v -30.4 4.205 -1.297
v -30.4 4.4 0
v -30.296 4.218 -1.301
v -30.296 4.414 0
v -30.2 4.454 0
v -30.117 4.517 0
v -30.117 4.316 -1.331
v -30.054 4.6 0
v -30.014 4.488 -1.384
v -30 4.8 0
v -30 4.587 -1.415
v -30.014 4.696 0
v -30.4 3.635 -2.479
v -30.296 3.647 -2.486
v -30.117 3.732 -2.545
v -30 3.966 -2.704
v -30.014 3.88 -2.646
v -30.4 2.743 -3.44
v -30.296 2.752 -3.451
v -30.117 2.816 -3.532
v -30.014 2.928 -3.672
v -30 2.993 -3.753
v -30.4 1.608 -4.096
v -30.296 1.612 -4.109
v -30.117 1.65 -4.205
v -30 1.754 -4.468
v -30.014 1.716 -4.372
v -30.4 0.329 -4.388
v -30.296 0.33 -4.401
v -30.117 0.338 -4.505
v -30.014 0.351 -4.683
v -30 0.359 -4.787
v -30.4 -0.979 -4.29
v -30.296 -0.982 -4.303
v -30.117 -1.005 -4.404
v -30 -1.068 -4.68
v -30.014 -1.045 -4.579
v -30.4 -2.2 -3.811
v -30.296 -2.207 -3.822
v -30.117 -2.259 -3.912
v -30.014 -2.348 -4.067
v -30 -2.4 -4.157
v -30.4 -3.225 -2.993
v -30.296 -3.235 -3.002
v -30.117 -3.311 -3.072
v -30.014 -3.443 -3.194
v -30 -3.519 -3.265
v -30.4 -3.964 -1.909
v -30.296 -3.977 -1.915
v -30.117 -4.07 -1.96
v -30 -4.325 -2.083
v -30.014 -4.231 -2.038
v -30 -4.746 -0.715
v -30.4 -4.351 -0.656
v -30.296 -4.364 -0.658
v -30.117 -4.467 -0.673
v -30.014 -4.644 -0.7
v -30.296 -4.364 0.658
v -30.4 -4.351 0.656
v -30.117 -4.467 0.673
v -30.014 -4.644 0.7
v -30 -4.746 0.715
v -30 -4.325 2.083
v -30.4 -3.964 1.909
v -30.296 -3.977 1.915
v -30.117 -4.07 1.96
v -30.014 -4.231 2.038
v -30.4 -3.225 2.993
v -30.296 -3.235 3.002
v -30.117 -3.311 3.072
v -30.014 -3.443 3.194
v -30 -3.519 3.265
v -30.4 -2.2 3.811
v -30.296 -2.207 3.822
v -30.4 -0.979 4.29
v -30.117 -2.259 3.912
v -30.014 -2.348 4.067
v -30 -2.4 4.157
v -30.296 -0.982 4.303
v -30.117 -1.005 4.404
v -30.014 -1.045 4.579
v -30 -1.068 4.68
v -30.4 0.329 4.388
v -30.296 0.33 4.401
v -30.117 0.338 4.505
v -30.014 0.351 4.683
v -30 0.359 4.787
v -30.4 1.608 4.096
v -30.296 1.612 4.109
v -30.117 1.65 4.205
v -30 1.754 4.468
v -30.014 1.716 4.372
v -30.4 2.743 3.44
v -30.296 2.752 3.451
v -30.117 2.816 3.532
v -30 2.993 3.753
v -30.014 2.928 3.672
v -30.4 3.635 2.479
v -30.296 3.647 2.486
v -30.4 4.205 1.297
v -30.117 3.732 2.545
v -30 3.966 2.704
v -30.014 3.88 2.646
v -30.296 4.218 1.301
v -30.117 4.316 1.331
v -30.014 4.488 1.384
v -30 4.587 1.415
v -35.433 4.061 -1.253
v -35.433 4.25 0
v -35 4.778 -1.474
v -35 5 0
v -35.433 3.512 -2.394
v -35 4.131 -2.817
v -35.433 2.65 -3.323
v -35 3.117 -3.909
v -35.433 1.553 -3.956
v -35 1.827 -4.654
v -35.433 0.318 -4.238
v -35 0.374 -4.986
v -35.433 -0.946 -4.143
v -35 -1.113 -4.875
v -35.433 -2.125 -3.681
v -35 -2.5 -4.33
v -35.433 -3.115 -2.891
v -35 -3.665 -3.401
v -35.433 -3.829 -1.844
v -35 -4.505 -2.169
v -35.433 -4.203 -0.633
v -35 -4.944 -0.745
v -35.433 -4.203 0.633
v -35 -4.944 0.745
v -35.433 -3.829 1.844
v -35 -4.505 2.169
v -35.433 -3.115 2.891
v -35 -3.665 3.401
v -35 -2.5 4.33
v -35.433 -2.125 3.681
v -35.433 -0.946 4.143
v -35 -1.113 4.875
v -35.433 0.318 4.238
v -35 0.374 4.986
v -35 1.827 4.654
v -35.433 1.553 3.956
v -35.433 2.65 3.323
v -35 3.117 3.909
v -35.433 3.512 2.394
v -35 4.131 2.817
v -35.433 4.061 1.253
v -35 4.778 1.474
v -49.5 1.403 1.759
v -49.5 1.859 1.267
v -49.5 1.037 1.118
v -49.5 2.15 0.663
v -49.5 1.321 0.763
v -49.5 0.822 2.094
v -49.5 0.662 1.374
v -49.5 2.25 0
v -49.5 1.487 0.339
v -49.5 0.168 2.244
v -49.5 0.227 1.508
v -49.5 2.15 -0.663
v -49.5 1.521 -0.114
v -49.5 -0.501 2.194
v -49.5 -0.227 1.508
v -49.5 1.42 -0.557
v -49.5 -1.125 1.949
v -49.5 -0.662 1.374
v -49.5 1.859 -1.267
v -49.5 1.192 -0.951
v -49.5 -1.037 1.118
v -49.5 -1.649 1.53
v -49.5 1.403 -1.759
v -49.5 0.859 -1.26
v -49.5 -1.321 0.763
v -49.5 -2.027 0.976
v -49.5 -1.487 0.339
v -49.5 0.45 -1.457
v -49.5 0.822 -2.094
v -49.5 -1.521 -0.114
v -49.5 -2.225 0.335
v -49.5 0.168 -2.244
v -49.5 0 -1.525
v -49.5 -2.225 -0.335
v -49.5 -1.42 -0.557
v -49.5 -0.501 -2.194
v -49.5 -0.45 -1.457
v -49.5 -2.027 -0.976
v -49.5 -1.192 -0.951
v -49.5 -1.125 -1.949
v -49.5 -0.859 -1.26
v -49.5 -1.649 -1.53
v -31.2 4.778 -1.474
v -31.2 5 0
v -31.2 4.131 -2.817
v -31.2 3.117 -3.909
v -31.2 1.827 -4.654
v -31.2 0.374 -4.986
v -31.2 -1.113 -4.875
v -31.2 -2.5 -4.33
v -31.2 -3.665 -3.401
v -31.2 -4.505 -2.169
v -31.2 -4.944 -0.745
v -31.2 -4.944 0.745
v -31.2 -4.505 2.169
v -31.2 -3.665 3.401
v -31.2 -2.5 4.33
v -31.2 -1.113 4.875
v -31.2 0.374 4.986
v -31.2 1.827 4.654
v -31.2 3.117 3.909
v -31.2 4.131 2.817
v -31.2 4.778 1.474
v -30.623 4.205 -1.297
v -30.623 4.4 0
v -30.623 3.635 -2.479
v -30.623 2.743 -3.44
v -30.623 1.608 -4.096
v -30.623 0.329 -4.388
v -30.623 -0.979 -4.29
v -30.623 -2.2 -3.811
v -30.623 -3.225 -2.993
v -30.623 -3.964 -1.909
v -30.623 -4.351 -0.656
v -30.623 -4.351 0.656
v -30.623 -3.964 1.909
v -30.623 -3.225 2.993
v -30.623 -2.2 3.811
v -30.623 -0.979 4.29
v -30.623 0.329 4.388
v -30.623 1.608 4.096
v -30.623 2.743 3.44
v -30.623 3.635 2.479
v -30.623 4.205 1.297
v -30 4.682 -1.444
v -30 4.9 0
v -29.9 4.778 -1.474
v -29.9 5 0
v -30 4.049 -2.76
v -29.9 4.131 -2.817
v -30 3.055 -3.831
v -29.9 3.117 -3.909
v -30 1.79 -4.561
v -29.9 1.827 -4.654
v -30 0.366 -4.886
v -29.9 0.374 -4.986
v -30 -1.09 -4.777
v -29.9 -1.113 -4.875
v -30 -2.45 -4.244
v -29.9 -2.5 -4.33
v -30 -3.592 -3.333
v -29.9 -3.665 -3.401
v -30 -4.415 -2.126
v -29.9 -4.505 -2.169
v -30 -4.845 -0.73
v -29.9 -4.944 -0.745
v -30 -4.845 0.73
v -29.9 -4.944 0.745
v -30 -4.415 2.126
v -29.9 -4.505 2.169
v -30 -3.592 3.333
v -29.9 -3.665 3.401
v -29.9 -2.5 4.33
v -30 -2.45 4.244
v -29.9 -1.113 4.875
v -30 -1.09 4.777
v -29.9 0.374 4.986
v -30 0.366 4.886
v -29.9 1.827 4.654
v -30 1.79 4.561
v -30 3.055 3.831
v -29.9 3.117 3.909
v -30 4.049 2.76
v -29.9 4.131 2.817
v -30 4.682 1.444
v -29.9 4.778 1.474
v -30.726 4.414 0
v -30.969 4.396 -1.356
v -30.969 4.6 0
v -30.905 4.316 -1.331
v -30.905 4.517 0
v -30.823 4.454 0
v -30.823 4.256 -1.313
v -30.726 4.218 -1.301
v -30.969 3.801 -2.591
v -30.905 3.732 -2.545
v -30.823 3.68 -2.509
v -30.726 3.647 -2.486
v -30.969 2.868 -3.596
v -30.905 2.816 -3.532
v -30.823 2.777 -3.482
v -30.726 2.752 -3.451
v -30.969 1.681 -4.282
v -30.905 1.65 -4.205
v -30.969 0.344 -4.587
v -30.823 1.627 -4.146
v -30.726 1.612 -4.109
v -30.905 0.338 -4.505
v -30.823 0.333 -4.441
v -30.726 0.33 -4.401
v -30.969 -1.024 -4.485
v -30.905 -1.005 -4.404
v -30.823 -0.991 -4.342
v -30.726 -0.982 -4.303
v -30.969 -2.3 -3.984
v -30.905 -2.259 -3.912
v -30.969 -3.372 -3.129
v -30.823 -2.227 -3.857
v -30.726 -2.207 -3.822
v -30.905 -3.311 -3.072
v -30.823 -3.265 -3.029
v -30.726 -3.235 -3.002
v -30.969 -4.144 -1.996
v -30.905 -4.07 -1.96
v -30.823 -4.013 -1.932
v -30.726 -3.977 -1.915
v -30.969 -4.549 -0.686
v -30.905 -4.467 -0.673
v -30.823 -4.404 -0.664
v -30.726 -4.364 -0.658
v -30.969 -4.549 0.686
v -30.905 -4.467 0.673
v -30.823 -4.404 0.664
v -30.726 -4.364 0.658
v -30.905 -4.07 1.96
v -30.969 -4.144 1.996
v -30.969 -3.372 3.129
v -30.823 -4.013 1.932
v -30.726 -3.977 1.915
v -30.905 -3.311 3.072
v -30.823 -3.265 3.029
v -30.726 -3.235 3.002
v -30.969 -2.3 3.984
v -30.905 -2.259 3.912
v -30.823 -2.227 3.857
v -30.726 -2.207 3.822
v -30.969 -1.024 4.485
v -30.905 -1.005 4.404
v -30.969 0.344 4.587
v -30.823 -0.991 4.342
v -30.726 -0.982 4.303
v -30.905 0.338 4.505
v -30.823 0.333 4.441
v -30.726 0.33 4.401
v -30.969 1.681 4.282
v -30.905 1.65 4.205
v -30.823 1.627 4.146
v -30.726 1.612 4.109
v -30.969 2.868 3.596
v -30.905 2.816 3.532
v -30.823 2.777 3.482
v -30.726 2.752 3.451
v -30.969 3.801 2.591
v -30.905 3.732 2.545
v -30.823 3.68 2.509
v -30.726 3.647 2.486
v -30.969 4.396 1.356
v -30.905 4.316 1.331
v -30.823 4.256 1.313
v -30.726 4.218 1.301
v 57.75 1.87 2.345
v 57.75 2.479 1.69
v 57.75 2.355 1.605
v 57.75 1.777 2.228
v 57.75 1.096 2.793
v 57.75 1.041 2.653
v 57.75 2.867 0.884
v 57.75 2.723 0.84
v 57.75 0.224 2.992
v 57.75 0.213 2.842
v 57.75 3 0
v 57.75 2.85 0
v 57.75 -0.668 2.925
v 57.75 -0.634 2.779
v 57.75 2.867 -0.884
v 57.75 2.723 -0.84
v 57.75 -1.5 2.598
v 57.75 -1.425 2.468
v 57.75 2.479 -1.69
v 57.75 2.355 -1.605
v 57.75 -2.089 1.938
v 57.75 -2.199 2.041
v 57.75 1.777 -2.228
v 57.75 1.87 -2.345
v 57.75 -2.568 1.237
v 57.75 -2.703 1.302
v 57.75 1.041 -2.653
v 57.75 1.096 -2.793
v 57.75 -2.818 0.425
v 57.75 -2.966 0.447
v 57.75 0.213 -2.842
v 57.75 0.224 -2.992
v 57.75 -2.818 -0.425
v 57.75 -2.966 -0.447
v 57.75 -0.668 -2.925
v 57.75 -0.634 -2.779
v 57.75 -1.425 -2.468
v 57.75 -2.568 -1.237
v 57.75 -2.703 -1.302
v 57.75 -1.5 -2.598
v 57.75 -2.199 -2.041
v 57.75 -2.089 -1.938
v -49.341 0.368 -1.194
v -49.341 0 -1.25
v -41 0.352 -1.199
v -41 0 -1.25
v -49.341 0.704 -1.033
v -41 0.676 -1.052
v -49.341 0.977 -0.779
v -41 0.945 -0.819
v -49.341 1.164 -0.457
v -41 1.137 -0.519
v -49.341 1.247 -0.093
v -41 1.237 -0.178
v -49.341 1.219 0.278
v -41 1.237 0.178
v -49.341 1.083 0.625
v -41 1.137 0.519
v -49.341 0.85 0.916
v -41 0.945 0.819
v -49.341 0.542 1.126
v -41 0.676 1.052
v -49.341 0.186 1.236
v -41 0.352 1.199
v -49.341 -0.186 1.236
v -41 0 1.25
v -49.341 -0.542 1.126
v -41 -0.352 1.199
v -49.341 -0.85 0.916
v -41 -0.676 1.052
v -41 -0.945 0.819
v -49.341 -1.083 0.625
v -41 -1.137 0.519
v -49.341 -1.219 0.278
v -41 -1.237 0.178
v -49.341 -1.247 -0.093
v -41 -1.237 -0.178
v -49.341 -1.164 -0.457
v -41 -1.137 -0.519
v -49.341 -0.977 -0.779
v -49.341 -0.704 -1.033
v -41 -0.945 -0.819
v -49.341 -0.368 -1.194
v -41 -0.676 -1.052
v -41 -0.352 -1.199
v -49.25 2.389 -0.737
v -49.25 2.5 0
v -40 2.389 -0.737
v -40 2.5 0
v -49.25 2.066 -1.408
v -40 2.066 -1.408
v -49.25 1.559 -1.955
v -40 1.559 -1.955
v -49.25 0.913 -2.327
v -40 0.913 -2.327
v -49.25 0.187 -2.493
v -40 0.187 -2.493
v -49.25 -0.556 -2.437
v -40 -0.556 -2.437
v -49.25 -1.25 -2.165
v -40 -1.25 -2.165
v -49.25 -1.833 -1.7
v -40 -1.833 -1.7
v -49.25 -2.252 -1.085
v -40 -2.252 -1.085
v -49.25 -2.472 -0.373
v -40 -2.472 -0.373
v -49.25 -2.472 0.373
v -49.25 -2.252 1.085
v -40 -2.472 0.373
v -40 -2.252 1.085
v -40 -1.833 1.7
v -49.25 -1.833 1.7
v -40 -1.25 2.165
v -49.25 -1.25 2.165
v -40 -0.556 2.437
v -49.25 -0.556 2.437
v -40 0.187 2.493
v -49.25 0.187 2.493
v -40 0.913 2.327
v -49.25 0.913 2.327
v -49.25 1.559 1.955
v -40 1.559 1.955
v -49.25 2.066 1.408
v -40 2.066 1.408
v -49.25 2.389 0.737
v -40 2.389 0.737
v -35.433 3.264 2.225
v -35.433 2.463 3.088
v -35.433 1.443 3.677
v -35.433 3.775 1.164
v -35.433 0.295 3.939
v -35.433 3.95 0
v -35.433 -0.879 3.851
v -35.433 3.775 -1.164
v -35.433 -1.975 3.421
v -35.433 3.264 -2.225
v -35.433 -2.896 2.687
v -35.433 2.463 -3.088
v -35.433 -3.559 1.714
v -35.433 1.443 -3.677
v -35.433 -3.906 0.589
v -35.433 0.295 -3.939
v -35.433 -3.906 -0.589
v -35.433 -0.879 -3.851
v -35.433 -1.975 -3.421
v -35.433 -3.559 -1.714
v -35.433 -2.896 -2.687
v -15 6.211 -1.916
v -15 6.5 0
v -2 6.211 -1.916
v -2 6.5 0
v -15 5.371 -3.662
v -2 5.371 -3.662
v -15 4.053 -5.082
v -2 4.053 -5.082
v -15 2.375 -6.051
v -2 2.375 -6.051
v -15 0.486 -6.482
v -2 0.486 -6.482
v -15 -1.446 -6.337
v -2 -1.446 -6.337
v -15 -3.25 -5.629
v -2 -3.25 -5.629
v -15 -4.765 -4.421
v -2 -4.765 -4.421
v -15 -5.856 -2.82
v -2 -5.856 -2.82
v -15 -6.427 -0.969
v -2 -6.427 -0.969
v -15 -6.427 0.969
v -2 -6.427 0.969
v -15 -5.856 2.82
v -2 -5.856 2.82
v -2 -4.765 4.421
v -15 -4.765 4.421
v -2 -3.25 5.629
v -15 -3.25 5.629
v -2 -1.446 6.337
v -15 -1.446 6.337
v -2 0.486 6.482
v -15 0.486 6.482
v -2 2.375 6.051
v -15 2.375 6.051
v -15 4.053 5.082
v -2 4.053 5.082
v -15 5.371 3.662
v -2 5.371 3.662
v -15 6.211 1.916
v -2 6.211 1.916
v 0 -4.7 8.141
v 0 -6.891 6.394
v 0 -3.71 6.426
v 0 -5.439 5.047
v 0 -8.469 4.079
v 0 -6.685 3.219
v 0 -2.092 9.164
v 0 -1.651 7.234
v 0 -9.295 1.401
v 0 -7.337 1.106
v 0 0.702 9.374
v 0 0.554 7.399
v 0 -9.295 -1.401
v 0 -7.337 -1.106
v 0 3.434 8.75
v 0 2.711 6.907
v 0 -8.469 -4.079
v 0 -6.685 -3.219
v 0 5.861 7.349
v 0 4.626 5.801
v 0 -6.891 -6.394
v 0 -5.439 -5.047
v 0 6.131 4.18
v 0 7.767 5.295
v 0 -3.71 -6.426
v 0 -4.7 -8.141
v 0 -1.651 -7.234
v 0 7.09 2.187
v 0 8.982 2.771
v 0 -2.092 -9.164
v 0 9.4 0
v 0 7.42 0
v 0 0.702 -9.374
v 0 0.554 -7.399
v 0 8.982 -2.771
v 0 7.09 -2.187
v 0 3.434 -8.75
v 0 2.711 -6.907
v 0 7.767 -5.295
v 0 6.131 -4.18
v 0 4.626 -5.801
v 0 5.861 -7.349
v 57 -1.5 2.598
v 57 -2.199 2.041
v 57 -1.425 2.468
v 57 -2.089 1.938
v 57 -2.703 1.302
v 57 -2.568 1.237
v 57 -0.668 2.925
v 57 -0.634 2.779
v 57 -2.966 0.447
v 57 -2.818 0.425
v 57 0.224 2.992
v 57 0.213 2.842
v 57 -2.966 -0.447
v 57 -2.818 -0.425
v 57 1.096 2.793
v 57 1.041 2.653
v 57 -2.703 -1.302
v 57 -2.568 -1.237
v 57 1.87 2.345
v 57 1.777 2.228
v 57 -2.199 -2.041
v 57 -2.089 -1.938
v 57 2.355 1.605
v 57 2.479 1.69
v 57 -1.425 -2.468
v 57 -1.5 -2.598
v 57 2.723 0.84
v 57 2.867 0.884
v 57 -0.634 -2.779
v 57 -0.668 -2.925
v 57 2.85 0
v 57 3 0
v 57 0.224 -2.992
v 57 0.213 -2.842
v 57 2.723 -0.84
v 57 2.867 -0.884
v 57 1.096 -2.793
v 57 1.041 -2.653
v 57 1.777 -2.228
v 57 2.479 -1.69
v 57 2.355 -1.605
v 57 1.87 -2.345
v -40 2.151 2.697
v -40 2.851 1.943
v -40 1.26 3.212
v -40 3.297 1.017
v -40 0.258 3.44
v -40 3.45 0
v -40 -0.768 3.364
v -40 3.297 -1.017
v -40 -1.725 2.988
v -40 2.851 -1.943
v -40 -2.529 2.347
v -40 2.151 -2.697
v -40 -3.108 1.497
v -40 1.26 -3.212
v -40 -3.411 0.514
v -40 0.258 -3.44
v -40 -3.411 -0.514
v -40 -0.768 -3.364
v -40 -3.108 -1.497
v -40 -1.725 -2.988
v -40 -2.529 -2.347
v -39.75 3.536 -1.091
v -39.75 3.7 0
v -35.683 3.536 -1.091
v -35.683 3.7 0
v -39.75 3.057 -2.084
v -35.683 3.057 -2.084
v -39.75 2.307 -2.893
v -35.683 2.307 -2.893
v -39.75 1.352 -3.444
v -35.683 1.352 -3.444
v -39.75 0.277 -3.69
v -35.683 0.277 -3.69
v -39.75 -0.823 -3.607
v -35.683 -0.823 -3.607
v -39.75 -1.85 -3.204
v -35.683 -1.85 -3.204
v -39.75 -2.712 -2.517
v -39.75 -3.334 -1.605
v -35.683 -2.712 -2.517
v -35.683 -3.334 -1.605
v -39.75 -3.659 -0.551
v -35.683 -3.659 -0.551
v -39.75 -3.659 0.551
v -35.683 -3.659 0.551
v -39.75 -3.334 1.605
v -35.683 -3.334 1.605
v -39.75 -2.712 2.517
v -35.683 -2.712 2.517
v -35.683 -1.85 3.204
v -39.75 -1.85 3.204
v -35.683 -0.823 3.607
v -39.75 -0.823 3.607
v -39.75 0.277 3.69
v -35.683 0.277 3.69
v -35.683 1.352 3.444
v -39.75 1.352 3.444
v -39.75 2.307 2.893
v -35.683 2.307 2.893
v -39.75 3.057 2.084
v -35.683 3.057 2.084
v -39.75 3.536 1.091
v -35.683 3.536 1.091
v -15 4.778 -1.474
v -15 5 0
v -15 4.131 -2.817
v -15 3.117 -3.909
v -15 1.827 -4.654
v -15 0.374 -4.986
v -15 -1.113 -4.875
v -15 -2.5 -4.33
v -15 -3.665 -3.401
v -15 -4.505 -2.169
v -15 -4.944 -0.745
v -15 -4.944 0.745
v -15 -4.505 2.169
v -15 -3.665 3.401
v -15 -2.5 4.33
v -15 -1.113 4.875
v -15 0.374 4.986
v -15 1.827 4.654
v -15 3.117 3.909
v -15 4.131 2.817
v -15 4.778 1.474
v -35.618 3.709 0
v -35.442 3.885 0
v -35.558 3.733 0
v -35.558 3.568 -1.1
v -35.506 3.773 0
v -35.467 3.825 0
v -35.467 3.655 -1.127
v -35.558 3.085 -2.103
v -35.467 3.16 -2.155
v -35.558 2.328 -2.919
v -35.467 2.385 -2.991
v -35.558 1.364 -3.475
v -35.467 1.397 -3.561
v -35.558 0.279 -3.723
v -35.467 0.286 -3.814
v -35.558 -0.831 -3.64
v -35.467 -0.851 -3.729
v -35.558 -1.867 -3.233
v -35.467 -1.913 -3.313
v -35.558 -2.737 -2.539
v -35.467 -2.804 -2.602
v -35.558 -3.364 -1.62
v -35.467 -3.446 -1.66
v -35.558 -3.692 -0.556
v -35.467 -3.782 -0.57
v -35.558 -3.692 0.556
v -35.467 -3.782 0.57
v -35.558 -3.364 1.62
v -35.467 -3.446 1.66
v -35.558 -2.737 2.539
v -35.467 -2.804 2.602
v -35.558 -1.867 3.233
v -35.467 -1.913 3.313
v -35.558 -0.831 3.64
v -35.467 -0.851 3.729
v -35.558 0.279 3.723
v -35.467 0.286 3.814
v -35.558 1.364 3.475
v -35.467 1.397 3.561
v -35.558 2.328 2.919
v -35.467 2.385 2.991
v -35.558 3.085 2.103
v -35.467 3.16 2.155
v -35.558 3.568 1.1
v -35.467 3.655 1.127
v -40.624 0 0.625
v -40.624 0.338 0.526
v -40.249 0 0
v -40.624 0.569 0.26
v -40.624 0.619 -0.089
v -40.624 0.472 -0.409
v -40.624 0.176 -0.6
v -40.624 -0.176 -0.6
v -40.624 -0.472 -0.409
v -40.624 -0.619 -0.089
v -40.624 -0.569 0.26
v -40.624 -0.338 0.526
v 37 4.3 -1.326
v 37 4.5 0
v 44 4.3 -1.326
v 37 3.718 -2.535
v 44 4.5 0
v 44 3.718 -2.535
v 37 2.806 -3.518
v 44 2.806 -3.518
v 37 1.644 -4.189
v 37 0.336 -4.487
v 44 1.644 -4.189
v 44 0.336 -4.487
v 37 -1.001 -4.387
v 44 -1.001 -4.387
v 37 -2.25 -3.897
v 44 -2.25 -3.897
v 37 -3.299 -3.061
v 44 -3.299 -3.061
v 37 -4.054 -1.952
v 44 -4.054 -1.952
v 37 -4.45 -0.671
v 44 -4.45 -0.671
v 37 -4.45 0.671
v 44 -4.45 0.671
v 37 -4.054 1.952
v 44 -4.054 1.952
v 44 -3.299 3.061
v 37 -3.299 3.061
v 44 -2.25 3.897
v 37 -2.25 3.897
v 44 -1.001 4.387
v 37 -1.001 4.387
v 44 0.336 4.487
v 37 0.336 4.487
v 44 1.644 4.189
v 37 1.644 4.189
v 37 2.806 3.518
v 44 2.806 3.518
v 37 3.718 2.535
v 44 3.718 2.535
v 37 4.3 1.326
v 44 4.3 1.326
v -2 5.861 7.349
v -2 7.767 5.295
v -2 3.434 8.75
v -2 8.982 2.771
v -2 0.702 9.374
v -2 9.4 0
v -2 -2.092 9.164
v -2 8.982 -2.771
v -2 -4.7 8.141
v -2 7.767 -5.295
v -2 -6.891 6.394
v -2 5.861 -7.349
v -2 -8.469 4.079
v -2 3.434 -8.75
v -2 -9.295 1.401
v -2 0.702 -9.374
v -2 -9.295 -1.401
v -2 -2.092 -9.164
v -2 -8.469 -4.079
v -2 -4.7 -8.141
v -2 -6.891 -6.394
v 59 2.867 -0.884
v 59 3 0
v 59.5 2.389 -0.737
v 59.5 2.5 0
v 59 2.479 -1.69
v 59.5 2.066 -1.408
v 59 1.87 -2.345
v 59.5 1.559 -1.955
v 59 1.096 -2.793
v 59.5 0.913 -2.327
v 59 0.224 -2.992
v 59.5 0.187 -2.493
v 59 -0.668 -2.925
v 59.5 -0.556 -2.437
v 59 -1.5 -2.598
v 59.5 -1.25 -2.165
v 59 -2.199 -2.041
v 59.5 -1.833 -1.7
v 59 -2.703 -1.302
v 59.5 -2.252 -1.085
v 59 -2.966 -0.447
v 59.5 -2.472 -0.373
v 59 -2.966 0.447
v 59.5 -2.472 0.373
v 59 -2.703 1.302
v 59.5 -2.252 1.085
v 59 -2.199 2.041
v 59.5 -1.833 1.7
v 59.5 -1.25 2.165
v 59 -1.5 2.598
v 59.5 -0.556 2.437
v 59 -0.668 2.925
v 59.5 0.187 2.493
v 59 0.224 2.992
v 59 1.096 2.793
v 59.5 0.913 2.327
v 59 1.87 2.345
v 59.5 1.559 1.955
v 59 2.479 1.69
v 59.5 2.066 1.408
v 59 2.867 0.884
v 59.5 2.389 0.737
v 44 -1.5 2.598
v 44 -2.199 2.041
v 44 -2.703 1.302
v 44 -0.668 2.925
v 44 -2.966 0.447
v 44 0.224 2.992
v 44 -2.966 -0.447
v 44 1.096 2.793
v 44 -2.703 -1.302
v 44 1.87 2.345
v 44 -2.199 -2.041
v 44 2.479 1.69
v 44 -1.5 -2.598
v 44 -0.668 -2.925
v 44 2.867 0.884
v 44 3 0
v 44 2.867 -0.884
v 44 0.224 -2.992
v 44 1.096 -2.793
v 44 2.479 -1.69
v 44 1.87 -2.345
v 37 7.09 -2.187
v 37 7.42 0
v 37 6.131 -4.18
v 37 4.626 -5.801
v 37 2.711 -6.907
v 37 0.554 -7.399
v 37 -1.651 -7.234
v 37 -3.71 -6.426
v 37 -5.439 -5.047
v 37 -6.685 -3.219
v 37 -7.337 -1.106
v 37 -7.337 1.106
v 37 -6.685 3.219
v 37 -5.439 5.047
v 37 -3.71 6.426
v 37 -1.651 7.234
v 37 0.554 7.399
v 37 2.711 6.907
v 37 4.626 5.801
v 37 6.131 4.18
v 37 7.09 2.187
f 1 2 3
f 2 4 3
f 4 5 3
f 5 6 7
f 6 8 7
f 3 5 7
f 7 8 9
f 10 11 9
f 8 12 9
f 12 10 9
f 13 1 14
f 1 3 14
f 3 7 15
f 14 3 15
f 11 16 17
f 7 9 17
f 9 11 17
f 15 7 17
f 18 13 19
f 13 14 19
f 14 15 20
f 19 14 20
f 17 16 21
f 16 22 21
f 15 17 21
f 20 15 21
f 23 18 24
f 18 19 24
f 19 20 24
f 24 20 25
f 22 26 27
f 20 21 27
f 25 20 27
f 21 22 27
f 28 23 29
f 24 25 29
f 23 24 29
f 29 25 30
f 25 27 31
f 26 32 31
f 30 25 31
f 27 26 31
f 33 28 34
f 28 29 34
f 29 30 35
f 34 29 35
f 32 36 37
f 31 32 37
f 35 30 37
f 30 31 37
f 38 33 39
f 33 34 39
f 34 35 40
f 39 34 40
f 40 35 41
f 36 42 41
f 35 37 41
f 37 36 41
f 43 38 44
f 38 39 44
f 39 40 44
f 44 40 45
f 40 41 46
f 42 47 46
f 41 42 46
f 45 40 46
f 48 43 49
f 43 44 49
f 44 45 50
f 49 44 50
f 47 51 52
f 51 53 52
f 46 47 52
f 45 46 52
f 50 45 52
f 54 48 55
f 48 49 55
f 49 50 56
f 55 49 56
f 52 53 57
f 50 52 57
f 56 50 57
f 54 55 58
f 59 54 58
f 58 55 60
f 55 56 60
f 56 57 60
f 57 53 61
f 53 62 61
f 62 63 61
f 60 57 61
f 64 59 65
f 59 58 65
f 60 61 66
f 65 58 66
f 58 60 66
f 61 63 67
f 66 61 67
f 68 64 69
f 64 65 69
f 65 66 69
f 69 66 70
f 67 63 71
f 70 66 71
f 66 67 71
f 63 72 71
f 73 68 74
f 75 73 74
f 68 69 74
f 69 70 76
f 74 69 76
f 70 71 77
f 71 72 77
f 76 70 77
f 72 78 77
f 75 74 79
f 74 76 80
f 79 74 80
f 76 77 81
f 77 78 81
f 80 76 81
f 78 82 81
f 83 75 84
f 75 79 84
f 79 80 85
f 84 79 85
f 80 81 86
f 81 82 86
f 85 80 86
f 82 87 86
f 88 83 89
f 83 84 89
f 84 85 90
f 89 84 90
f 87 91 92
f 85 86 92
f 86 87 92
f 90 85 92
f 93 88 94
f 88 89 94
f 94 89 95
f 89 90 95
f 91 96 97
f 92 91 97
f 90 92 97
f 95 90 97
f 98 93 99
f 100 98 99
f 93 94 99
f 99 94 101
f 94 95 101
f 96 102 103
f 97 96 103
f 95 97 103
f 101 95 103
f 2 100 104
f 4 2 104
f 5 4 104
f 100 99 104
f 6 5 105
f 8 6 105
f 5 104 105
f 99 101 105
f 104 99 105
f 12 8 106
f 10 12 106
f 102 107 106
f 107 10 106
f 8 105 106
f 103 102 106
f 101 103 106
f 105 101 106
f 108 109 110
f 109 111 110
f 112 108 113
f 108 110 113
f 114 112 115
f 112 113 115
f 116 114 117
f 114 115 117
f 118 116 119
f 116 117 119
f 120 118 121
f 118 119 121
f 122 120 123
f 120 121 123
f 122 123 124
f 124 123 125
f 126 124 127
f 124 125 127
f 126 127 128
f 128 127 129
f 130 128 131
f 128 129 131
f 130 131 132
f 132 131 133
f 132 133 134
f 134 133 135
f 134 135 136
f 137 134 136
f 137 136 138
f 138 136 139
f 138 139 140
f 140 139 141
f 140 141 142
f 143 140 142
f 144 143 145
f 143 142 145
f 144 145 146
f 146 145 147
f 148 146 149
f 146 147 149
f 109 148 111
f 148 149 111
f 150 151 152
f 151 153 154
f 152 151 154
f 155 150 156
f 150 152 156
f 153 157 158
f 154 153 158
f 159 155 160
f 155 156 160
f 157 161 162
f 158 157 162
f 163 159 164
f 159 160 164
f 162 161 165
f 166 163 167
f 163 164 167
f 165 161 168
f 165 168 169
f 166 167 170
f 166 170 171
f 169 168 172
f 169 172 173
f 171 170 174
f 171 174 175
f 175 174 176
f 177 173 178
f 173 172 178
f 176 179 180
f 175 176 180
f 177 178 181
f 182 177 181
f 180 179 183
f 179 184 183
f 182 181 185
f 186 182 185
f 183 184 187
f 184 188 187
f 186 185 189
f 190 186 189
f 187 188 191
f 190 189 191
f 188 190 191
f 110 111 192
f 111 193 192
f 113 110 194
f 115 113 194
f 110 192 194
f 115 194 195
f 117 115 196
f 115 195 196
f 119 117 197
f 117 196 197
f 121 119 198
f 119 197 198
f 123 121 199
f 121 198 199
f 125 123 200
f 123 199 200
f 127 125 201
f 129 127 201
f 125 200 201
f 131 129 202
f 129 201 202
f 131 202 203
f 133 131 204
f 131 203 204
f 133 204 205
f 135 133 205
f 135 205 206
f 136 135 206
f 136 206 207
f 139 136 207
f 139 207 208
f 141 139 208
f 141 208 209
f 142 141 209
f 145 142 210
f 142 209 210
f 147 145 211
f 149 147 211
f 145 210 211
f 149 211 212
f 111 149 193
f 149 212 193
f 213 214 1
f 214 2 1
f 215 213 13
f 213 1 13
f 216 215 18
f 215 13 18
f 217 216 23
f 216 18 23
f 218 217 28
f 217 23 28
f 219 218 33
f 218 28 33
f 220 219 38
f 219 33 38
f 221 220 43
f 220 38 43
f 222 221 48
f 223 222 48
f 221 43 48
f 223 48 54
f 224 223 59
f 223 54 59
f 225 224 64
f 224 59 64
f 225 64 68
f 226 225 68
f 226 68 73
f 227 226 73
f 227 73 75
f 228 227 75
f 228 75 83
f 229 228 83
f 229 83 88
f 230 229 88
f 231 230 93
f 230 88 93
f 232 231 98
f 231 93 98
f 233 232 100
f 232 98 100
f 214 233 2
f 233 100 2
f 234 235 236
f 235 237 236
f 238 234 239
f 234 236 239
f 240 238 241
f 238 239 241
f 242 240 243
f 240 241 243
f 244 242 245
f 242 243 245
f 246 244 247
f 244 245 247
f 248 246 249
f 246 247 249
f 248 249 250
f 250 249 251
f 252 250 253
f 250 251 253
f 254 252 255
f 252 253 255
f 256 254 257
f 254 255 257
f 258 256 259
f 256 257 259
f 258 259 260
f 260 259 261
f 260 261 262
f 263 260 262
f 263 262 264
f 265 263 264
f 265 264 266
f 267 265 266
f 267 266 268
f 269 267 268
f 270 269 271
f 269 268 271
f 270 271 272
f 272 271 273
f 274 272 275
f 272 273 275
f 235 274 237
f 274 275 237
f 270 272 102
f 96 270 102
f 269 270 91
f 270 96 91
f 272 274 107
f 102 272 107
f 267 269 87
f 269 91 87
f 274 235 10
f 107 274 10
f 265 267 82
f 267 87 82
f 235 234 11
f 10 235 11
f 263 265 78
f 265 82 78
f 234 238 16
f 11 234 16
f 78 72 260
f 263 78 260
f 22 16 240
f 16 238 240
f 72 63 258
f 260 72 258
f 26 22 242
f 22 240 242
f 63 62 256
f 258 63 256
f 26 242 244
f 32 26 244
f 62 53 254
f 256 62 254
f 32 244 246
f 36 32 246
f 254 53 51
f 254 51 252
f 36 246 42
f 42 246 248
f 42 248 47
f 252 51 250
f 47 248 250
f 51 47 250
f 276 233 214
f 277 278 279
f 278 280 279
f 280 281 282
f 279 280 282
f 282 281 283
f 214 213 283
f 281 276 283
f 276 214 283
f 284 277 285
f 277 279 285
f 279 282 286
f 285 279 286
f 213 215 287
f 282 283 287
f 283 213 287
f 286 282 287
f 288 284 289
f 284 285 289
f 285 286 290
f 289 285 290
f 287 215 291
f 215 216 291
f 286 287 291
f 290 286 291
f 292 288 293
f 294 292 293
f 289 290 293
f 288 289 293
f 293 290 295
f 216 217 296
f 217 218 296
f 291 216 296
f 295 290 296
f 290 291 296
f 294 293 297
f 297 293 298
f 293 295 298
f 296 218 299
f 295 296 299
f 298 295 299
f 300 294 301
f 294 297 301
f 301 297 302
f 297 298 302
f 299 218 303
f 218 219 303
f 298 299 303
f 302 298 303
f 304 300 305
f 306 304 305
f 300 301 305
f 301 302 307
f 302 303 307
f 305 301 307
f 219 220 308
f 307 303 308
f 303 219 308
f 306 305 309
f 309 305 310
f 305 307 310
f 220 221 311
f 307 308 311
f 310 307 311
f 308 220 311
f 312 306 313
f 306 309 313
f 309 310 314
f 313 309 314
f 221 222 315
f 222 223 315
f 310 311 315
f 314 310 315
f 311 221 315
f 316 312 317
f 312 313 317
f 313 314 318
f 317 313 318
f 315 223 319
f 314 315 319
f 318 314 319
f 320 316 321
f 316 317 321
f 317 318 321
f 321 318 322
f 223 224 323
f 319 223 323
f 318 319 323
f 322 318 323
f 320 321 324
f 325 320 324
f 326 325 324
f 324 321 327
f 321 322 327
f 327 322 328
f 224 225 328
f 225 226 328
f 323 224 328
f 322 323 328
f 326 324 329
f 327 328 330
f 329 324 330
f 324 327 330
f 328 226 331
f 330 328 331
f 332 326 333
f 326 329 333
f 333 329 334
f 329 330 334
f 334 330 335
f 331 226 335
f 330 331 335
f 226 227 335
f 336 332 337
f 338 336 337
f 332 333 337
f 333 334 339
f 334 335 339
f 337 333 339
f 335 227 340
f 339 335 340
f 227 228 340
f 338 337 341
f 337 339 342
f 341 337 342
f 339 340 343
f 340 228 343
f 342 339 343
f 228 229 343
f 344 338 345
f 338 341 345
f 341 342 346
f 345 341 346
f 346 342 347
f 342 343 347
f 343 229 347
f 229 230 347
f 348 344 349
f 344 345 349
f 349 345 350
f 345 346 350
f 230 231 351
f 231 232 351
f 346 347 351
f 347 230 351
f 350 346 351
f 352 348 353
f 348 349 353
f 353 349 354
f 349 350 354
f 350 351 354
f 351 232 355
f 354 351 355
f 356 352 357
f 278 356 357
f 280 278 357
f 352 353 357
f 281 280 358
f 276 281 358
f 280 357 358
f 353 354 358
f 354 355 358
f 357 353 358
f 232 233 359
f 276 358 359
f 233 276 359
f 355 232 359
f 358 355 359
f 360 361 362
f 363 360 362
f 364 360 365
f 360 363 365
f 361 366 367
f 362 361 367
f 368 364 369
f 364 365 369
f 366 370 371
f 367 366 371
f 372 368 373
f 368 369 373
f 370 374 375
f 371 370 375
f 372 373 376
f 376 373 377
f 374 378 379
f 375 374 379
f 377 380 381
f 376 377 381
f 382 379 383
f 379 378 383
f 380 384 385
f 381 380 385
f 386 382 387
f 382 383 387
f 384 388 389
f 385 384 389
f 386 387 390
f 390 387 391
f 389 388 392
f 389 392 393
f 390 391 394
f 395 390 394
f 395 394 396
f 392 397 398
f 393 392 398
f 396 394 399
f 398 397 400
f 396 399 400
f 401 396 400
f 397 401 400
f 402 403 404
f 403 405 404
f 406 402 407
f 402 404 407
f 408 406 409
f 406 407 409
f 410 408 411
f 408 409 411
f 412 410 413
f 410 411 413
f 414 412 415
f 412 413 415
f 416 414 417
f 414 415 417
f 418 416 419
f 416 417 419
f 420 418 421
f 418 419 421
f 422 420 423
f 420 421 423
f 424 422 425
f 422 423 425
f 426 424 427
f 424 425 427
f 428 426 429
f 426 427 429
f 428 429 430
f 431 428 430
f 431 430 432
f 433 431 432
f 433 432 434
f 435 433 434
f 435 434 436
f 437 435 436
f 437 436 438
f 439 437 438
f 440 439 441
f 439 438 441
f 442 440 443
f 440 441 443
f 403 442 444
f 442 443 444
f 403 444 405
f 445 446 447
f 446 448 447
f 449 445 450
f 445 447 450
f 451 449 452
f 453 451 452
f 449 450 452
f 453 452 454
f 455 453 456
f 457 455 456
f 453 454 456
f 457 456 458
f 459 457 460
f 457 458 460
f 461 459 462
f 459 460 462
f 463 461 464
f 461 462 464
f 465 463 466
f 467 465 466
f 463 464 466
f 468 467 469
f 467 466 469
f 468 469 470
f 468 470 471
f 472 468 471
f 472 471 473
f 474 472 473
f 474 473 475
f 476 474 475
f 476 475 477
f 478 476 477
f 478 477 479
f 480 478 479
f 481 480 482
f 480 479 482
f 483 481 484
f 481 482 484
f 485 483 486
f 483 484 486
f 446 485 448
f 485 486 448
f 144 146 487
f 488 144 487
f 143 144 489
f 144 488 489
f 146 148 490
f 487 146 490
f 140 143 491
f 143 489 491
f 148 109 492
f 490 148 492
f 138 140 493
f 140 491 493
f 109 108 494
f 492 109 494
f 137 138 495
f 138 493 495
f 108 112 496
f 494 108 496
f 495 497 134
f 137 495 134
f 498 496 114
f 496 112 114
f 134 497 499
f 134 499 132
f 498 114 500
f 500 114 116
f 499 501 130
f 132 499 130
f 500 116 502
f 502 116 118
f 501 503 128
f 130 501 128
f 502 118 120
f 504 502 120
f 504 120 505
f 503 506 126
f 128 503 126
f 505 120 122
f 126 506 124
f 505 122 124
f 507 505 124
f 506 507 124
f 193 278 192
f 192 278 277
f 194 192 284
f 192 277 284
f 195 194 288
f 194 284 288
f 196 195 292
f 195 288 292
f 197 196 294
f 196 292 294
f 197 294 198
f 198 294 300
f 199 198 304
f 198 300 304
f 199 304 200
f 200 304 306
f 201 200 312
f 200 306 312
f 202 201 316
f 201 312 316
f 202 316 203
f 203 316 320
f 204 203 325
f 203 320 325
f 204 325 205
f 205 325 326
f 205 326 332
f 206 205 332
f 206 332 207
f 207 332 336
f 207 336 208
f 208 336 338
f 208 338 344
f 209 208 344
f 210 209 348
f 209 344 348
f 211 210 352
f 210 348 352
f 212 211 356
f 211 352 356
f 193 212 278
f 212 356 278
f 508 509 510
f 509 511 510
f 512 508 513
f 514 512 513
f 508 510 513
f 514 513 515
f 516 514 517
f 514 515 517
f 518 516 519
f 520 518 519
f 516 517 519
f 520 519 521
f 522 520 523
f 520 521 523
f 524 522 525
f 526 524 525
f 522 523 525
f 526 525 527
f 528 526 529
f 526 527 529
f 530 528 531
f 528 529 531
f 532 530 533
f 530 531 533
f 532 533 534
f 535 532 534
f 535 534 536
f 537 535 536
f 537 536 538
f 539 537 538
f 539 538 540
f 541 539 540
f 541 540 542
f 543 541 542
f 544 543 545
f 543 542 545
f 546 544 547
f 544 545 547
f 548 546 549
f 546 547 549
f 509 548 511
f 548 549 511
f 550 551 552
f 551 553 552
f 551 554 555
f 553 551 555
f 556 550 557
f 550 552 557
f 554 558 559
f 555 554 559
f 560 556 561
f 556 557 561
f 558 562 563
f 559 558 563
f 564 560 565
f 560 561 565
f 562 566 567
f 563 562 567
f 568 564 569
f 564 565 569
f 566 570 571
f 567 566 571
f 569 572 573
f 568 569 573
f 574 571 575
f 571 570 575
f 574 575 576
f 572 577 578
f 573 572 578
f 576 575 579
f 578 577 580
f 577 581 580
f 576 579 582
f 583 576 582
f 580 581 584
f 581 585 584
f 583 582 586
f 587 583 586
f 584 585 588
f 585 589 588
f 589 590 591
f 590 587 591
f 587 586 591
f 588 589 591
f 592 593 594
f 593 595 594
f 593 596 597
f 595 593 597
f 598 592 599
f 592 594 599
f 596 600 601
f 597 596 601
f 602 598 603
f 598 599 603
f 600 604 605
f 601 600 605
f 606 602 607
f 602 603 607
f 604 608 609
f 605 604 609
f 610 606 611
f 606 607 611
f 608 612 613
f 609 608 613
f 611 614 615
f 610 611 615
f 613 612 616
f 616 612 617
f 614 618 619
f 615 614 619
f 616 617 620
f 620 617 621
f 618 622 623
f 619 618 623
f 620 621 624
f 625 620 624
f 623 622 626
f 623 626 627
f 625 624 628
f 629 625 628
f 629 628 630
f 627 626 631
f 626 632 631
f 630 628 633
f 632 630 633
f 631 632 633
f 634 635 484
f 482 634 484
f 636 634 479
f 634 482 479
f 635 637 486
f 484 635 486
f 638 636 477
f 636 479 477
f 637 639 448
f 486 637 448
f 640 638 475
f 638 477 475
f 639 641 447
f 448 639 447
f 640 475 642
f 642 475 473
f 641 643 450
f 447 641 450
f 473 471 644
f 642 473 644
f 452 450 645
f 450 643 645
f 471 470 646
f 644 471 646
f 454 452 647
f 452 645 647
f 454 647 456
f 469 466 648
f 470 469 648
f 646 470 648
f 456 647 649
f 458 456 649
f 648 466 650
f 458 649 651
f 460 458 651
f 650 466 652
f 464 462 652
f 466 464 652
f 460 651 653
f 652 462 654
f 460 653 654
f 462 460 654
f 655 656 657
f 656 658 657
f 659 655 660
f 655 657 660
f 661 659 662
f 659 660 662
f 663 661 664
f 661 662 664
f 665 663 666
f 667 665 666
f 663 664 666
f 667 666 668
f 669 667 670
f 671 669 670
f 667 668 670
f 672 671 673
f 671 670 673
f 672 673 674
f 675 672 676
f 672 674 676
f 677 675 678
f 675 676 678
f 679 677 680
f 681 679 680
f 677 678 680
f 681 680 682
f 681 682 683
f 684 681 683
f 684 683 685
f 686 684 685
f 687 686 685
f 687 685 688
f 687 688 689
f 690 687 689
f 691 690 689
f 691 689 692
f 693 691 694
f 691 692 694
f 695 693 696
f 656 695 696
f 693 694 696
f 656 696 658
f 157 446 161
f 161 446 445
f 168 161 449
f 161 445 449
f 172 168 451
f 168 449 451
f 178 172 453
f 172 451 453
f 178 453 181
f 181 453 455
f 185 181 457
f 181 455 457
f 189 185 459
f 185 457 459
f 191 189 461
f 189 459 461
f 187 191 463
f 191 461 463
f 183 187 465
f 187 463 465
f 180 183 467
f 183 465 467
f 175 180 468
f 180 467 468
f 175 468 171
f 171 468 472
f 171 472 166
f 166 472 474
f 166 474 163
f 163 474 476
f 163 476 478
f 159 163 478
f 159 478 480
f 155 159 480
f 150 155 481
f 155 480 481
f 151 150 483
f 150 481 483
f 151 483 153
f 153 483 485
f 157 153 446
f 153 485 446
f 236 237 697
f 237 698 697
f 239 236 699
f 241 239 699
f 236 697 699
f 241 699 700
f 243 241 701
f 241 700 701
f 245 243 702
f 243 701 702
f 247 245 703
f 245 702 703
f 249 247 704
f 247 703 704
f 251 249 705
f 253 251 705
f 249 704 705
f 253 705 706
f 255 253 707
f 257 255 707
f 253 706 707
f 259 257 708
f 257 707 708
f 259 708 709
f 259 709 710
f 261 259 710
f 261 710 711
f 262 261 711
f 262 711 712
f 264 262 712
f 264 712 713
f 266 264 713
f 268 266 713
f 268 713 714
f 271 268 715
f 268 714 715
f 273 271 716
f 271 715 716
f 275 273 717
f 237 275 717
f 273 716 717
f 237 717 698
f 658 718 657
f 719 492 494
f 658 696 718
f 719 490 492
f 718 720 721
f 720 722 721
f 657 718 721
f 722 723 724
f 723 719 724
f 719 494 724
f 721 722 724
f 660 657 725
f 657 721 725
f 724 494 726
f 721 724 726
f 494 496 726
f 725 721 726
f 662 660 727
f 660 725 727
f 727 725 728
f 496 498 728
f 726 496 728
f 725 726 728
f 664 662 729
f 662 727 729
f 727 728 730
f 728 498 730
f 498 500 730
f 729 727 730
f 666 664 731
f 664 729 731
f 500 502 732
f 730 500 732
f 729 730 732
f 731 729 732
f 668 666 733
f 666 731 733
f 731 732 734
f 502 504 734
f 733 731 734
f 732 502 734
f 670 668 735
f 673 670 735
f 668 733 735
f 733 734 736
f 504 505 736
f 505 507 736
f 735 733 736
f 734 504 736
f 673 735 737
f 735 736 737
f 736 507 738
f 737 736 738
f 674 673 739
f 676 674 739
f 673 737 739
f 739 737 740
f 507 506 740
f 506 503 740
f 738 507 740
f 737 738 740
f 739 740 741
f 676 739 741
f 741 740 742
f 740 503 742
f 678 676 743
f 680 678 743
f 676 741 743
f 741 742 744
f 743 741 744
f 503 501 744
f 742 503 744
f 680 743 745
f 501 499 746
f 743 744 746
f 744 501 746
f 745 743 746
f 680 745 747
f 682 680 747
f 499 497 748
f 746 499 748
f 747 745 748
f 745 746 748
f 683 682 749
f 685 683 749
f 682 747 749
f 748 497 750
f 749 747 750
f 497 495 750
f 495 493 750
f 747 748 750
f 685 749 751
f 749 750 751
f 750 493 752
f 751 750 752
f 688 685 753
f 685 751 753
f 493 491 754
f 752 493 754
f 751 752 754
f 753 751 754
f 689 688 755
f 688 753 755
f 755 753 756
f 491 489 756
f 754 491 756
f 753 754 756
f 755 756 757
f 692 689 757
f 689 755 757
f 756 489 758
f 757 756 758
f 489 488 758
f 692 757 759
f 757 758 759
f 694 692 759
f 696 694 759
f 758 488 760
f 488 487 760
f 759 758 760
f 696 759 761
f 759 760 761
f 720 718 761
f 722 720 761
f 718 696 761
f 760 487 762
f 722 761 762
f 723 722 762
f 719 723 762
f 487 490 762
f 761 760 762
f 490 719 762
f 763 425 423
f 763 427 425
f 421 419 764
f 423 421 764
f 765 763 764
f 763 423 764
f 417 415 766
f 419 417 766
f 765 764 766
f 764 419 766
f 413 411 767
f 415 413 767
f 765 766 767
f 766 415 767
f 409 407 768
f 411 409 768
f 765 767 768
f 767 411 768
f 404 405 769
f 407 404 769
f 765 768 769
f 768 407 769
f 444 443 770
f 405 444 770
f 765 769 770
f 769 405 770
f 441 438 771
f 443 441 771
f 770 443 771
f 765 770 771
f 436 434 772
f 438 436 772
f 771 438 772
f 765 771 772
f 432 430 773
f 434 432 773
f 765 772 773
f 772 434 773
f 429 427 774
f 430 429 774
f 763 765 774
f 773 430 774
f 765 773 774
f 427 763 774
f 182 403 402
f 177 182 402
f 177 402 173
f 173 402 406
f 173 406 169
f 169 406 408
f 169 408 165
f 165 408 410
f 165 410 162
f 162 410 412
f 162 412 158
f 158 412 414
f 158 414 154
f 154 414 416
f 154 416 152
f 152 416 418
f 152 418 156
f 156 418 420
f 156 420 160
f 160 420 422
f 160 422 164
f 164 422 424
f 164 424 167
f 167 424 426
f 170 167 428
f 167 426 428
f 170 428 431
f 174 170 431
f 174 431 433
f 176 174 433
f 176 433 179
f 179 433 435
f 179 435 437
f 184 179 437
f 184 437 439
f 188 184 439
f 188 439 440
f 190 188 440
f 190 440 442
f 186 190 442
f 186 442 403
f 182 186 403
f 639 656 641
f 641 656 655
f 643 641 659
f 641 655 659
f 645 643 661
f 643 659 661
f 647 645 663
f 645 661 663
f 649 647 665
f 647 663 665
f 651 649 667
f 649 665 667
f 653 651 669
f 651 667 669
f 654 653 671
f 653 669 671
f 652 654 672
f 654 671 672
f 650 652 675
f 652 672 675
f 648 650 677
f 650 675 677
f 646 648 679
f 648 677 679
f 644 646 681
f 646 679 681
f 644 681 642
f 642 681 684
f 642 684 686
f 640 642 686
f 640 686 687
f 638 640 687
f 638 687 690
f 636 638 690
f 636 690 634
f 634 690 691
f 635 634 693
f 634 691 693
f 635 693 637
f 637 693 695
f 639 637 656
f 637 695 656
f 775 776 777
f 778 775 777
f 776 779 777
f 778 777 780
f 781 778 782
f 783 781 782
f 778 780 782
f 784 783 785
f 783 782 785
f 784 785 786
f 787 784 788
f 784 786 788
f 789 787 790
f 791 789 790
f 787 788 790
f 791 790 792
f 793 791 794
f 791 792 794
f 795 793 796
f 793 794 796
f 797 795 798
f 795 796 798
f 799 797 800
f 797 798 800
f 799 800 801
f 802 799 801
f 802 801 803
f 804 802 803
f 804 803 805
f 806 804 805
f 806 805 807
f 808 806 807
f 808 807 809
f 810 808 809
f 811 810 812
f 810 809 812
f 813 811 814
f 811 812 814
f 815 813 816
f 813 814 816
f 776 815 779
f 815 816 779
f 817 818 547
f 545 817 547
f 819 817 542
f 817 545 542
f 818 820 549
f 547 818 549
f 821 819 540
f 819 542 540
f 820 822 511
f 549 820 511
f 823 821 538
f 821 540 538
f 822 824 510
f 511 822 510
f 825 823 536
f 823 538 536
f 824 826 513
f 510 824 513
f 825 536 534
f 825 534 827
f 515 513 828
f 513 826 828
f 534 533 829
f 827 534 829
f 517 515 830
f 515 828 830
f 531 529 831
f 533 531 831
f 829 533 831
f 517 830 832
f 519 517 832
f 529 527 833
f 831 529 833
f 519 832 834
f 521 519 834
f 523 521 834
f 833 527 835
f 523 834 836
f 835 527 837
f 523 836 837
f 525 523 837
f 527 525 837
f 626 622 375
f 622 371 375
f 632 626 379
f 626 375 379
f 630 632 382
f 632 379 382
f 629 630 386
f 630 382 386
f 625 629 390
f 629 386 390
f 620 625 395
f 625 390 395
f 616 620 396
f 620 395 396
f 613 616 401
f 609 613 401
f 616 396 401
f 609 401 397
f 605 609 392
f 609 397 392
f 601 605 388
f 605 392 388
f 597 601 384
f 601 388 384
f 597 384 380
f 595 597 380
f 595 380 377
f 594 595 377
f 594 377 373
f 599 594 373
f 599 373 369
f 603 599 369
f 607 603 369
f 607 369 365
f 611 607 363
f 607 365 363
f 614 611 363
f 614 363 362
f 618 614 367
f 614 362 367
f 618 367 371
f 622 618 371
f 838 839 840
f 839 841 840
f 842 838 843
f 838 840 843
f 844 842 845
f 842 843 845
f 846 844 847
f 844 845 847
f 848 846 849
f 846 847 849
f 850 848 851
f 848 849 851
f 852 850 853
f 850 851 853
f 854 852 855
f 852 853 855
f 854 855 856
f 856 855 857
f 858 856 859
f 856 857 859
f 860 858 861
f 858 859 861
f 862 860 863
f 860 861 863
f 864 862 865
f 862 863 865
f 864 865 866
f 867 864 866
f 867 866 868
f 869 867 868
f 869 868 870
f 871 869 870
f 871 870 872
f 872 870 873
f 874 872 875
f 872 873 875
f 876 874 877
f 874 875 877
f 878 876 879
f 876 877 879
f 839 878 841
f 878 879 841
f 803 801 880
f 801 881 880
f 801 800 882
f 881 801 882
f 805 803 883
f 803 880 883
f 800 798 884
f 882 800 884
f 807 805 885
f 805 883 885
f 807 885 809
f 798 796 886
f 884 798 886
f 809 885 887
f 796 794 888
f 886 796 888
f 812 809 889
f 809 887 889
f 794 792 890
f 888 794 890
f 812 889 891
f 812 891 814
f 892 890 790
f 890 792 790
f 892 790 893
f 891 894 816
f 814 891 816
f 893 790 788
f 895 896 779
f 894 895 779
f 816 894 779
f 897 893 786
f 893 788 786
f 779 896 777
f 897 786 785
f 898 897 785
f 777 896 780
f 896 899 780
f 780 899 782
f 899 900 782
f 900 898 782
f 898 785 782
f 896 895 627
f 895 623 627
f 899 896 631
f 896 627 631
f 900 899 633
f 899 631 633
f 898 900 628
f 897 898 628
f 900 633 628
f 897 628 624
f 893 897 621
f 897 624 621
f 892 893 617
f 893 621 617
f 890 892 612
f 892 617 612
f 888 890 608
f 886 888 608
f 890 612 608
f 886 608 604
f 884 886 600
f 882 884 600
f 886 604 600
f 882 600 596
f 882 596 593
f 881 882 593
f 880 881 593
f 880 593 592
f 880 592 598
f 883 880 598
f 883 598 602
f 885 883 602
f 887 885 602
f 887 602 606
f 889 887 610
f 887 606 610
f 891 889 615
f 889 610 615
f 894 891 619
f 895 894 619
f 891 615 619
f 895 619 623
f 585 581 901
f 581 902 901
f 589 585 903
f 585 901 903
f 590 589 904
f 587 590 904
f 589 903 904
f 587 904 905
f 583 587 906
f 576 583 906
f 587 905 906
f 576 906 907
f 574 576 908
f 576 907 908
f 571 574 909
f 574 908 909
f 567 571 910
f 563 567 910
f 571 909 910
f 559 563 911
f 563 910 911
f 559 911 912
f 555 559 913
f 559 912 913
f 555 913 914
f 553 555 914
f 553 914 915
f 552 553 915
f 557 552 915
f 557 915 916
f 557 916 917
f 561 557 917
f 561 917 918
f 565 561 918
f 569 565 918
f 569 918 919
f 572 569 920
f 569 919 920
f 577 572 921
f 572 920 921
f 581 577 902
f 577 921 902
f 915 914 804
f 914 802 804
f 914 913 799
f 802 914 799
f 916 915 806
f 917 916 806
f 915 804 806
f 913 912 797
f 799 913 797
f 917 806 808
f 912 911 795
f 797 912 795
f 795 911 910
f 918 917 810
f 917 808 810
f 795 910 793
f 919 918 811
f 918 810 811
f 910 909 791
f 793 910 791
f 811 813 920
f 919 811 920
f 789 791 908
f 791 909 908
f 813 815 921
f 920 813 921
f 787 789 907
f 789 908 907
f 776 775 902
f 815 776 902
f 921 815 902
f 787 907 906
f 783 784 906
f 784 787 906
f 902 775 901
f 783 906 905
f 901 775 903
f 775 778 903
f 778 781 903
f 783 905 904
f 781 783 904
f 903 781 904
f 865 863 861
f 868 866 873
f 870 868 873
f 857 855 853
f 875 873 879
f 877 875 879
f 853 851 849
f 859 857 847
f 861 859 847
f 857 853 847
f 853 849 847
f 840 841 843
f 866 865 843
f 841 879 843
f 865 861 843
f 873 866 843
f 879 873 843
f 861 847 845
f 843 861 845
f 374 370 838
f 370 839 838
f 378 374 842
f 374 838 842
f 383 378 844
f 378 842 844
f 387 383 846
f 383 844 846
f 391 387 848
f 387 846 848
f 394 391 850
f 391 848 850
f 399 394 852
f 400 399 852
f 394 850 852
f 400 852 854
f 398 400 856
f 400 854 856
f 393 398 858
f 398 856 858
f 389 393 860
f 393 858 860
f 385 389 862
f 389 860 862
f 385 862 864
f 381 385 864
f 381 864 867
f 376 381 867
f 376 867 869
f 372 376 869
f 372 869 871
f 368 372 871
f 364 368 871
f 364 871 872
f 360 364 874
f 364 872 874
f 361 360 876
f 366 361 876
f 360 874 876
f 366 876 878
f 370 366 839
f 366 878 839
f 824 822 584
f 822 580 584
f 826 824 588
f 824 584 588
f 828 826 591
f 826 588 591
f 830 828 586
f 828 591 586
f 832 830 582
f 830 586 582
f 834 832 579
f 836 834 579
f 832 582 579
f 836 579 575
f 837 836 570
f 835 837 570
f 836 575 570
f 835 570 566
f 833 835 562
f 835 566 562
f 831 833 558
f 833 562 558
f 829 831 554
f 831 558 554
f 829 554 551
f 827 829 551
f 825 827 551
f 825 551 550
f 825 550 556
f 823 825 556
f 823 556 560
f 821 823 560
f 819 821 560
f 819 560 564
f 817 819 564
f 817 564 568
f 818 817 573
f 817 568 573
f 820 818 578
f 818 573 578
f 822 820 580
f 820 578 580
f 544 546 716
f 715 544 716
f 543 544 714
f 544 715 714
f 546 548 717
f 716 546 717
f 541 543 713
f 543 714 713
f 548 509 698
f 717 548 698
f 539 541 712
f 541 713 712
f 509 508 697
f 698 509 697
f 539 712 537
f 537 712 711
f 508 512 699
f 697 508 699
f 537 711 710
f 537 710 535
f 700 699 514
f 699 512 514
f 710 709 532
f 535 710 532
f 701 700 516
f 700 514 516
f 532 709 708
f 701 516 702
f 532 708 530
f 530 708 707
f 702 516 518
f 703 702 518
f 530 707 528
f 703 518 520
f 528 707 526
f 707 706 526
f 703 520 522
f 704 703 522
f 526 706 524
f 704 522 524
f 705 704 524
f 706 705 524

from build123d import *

# Parameters (mm, degrees)
M3_TAPPED_HOLE1_D           = 2.5
M3_TAPPED_HOLE1_DEPTH       = 8.5
M3_TAPPED_HOLE1_CSINK_D     = 3.05
M3_TAPPED_HOLE1_CSINK_ANGLE = 120
M3_TAPPED_HOLE1_TIP         = 0.751075774


with BuildPart() as part:
    # Sketch1 → Revolve3 (revolve)
    with BuildSketch(Plane.XY):
        with BuildLine():
            Line((-35, 5), (-31.2, 5))
            Line((-31.2, 5), (-30.969059892, 4.6))
            ThreePointArc((-30.969059892, 4.6), (-30.822649731, 4.453589838), (-30.622649731, 4.4))
            Line((-30.622649731, 4.4), (-30.4, 4.4))
            ThreePointArc((-30.4, 4.4), (-30.117157288, 4.517157288), (-30, 4.8))
            Line((-30, 4.8), (-30, 4.9))
            Line((-30, 4.9), (-29.9, 5))
            Line((-29.9, 5), (-15, 5))
            Line((-15, 5), (-15, 6.5))
            Line((-15, 6.5), (-2, 6.5))
            Line((-2, 6.5), (-2, 9.4))
            Line((-2, 9.4), (0, 9.4))
            Line((0, 9.4), (0, 7.42))
            Line((0, 7.42), (37, 7.42))
            Line((37, 7.42), (37, 4.5))
            Line((37, 4.5), (44, 4.5))
            Line((44, 4.5), (44, 3))
            Line((44, 3), (57, 3))
            Line((57, 3), (57, 2.85))
            Line((57, 2.85), (57.75, 2.85))
            Line((57.75, 2.85), (57.75, 3))
            Line((57.75, 3), (59, 3))
            Line((59, 3), (59.5, 2.5))
            Line((59.5, 2.5), (59.5, 0))
            Line((59.5, 0), (-49.5, 0))
            Line((-49.5, 0), (-49.5, 2.25))
            Line((-49.5, 2.25), (-49.25, 2.5))
            Line((-49.25, 2.5), (-40, 2.5))
            Line((-40, 2.5), (-40, 3.45))
            Line((-40, 3.45), (-39.75, 3.7))
            Line((-39.75, 3.7), (-35.683012702, 3.7))
            ThreePointArc((-35.683012702, 3.7), (-35.506236007, 3.773223305), (-35.433012702, 3.95))
            Line((-35.433012702, 3.95), (-35.433012702, 4.25))
            Line((-35.433012702, 4.25), (-35, 5))
        make_face()
    revolve(axis=Axis((88.99, 0, 0), (-1, 0, 0)))

    # M3 Tapped Hole1
    with Locations(Plane.ZY.offset(49.5)):
        with Locations((0, 0)):
            CounterSinkHole(M3_TAPPED_HOLE1_D / 2, M3_TAPPED_HOLE1_CSINK_D / 2, depth=M3_TAPPED_HOLE1_DEPTH, counter_sink_angle=M3_TAPPED_HOLE1_CSINK_ANGLE)
            with Locations((0, 0, -(M3_TAPPED_HOLE1_DEPTH + M3_TAPPED_HOLE1_TIP / 2))):  # 118° drill point
                Cone(0, M3_TAPPED_HOLE1_D / 2, M3_TAPPED_HOLE1_TIP, mode=Mode.SUBTRACT)


solid = part.part
